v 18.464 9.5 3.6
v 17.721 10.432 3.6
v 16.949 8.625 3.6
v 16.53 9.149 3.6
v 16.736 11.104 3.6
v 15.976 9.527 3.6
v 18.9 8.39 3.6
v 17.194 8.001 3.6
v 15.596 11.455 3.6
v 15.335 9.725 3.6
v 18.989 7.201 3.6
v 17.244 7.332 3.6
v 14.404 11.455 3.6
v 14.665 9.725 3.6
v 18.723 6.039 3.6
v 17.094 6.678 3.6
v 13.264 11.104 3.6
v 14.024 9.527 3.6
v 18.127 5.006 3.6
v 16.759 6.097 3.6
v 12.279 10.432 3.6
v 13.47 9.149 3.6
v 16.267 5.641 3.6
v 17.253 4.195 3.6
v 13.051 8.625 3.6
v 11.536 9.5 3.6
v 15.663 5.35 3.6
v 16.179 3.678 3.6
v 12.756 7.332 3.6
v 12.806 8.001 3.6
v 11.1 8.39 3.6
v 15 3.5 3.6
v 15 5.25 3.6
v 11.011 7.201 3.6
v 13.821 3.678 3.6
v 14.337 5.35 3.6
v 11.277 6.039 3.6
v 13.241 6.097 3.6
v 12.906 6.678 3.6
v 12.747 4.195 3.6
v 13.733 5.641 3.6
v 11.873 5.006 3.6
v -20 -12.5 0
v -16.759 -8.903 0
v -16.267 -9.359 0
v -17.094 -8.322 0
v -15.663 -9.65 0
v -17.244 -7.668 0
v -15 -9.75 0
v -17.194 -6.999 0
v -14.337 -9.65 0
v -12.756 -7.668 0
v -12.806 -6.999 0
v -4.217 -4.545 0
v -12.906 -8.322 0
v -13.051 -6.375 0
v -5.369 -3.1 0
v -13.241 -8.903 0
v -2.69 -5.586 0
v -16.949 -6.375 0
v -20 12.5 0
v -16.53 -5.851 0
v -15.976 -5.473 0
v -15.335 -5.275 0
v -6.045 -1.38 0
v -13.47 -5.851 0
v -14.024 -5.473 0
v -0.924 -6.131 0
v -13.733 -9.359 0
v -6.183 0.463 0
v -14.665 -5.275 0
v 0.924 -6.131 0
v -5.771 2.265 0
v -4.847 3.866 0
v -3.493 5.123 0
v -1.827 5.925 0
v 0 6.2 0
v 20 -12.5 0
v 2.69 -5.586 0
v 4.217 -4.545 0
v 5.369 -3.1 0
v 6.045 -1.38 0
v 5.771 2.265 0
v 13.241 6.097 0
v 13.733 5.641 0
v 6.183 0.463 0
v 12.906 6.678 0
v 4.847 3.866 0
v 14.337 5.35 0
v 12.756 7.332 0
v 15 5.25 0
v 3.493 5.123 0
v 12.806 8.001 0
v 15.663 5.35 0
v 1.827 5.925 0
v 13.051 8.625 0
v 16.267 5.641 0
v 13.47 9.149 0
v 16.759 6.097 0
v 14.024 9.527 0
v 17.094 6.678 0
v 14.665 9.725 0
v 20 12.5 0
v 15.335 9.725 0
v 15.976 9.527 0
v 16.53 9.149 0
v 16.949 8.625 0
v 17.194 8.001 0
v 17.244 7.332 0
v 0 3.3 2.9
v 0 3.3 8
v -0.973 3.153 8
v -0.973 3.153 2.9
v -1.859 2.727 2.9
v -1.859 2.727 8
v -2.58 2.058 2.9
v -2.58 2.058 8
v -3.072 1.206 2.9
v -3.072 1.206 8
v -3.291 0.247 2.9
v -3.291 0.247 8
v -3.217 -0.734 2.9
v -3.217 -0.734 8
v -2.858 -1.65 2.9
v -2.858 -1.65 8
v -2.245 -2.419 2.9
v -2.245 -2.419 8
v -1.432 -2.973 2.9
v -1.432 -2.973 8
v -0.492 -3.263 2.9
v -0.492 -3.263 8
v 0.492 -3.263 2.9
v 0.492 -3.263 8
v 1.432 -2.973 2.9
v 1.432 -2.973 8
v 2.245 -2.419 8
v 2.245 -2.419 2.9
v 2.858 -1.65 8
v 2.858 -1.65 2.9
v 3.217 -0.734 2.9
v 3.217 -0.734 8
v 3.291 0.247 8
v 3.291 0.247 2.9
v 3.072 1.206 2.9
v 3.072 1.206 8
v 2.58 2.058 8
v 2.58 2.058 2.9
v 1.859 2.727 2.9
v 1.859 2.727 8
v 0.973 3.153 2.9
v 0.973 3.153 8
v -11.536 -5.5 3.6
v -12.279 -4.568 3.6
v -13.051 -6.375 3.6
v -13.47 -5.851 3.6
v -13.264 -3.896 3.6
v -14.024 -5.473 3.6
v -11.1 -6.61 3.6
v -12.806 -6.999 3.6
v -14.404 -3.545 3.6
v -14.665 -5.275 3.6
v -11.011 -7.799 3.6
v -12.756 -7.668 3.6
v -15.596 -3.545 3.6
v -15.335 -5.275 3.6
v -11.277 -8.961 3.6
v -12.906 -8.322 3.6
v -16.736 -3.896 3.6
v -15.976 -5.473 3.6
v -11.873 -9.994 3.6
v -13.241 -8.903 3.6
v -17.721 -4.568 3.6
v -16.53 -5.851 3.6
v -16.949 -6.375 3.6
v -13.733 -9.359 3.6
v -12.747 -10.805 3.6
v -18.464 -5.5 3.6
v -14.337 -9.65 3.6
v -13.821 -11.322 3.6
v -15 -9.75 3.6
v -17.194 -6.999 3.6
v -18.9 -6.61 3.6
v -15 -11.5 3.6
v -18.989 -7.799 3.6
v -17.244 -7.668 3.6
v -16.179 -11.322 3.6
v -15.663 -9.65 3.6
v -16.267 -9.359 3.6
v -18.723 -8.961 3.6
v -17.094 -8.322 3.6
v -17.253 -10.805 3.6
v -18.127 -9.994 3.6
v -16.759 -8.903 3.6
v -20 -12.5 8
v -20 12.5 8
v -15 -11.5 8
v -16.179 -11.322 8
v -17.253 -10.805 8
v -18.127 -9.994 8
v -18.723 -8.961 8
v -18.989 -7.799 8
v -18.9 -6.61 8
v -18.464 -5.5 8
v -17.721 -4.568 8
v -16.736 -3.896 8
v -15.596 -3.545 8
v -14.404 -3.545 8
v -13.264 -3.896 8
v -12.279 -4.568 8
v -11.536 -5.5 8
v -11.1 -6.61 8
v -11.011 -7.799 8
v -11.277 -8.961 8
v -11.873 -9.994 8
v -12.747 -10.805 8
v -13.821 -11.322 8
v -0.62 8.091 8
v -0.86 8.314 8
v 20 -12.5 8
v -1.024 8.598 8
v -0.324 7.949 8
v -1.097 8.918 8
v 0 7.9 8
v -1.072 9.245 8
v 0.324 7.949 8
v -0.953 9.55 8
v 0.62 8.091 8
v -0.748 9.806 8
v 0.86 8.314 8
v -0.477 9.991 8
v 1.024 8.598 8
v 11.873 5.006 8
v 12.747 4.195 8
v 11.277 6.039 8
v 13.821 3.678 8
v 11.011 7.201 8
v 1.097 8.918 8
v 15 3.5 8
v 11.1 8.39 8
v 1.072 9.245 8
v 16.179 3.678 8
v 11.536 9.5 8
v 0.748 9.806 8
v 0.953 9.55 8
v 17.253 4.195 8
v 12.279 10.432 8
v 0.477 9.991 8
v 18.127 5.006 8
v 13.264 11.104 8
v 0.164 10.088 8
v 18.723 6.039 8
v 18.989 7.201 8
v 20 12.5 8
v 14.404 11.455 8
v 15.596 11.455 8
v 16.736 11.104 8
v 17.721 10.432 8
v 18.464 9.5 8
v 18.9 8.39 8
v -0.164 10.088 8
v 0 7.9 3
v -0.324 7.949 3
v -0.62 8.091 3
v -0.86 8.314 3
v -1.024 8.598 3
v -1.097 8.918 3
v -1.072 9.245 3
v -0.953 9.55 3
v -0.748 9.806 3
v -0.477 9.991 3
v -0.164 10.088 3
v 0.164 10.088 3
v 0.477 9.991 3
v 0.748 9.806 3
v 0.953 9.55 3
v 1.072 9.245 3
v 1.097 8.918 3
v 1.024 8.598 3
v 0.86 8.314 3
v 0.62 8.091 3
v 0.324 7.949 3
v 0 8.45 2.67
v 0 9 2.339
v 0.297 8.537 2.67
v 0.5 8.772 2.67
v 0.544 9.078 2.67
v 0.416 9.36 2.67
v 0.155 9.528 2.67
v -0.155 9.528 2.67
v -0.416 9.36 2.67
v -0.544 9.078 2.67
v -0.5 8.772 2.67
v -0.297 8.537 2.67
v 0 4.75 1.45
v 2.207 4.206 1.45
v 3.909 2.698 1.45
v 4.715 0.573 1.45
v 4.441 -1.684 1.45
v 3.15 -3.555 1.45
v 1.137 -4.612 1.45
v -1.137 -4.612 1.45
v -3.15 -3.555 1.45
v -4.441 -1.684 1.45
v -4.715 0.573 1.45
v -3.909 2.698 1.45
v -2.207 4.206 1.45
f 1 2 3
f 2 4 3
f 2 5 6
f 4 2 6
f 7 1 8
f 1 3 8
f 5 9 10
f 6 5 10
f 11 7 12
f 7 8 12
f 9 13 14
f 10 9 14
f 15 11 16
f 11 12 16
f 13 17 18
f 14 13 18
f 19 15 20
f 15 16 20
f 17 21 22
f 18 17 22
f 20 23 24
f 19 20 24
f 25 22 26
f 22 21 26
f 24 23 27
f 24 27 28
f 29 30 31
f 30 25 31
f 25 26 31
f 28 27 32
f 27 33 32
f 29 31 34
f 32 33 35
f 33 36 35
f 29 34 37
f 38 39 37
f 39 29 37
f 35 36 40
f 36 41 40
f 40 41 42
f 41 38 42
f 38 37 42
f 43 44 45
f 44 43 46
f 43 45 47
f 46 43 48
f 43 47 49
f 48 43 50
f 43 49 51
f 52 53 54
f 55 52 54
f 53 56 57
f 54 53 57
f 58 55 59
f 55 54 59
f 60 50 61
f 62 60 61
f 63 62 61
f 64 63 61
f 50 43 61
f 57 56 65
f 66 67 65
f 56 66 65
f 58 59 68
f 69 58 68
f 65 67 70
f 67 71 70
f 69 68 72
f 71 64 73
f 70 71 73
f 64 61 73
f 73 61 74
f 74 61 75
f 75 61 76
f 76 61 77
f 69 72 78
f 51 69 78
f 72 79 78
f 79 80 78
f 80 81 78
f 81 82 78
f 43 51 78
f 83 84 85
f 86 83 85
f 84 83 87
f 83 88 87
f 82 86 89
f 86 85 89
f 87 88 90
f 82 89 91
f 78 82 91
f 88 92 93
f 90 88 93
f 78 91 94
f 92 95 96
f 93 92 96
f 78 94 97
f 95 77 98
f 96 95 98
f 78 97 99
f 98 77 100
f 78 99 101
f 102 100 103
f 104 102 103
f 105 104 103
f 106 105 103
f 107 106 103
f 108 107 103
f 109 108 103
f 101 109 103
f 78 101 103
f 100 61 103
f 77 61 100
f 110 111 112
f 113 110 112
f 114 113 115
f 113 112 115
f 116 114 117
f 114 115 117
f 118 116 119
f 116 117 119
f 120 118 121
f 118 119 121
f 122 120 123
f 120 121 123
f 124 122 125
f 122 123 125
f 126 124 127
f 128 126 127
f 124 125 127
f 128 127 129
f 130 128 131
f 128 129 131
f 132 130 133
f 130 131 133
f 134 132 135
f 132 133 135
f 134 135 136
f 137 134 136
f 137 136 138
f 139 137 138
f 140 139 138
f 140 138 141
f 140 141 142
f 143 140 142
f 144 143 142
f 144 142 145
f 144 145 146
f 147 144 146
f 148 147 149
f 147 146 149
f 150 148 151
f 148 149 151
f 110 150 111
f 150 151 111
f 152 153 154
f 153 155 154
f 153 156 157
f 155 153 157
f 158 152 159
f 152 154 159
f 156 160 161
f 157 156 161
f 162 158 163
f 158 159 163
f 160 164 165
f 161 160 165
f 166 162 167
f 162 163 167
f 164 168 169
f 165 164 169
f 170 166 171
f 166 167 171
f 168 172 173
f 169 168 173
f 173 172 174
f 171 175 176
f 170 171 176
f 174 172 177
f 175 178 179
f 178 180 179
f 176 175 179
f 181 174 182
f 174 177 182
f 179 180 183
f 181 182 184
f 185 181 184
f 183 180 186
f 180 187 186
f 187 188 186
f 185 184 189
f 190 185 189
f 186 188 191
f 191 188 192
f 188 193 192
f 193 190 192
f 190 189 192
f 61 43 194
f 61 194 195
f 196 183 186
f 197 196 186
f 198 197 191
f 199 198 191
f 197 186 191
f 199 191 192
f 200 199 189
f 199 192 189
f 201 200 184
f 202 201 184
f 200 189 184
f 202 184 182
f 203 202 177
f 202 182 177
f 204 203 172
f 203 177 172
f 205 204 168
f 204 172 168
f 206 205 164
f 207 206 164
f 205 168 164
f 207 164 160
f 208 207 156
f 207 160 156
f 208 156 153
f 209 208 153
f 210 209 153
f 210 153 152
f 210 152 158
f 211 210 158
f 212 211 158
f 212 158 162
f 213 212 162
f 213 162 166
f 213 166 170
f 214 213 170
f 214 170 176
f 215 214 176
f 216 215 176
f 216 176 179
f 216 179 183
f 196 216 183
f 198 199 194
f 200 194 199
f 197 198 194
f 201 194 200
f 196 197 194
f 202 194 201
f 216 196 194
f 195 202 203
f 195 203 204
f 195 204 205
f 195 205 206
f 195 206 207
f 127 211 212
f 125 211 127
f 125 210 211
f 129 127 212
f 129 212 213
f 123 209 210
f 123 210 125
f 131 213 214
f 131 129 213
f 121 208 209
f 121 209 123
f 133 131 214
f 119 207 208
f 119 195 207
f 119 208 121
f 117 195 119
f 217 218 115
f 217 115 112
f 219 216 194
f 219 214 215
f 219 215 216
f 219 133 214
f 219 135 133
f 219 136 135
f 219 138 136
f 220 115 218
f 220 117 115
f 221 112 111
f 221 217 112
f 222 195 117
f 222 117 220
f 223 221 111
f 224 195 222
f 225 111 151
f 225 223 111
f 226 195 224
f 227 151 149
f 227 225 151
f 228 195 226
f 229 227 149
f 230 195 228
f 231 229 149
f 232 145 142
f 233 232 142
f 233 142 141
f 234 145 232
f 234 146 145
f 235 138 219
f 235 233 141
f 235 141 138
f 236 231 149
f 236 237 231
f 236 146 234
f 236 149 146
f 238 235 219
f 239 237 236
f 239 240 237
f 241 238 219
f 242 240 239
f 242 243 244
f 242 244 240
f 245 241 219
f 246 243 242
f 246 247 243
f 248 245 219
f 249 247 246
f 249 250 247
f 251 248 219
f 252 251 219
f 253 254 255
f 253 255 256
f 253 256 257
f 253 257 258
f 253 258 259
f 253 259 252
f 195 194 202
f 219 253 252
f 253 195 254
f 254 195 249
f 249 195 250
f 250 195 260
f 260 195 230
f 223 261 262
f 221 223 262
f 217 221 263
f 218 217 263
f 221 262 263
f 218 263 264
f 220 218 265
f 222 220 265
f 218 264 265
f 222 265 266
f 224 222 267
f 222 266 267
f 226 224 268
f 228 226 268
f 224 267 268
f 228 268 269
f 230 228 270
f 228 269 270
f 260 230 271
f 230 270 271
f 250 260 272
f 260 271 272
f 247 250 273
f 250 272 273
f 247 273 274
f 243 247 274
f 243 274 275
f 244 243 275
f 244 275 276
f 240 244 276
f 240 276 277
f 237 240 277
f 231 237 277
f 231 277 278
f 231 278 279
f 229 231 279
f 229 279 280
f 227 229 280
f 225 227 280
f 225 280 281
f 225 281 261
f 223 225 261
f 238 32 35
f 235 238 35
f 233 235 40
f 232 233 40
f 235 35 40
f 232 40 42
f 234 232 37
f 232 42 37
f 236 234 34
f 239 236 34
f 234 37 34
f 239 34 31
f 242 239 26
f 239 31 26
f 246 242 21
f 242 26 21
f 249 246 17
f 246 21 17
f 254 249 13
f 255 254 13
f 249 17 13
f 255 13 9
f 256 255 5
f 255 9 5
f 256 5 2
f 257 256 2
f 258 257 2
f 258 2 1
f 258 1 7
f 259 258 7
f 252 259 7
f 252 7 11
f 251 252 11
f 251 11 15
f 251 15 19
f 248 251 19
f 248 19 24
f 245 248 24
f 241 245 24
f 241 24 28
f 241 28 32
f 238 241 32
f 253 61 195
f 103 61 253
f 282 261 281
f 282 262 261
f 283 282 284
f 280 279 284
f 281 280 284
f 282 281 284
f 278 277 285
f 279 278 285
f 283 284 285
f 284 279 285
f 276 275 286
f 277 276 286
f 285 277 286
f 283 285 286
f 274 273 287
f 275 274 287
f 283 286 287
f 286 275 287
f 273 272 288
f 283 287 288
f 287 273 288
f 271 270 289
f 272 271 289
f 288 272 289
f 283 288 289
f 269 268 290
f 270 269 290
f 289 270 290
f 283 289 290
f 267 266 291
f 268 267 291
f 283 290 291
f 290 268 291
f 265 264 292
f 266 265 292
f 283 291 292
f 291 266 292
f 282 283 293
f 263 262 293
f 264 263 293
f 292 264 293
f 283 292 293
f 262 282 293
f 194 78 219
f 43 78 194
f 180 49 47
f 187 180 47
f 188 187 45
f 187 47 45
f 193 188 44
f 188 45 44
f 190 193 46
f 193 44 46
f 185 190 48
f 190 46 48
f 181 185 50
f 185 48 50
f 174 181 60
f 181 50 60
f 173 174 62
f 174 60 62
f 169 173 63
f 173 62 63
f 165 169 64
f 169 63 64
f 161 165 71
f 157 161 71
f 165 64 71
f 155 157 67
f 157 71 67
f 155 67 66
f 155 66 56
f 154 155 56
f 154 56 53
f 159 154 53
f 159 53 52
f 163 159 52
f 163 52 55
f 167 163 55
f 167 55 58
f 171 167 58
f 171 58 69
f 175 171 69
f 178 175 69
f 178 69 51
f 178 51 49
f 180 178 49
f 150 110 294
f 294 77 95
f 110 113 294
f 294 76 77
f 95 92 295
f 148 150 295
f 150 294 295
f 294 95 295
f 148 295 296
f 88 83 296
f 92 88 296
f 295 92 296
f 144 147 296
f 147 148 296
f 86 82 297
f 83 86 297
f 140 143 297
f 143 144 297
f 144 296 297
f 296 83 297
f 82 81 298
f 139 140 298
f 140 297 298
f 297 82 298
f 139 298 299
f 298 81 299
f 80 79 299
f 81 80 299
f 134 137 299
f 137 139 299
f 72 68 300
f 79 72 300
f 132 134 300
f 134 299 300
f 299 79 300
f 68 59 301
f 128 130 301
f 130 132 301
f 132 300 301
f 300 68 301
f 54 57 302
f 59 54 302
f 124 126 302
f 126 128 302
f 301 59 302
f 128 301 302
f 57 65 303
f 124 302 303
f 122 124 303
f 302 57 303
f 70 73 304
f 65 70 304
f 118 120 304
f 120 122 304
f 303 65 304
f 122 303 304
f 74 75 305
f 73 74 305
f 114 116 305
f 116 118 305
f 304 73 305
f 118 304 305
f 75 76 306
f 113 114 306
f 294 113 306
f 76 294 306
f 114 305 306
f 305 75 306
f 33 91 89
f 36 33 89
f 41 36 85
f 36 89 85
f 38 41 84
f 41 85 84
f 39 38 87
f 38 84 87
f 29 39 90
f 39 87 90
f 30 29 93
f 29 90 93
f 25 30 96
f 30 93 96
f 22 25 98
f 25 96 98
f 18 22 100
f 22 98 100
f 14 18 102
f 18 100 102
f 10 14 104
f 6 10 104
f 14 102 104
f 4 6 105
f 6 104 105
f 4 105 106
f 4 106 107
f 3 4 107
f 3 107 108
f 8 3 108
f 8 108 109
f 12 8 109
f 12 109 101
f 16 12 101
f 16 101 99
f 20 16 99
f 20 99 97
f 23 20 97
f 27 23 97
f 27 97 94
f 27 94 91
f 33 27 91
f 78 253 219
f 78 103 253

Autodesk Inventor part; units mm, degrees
ref_plane "YZ Plane" through (0, 0, 0) normal (1, 0, 0) x (0, 1, 0)
ref_plane "XZ Plane" through (0, 0, 0) normal (0, 1, 0) x (-1, 0, 0)
ref_plane "XY Plane" through (0, 0, 0) normal (0, 0, 1) x (1, 0, 0)
sketch "Skizze1" plane through (0, 0, 0) normal (0, 0, 1) x (1, 0, 0)
  line L0 (-20, 12.5) -> (20, 12.5)
  line L1 (20, 12.5) -> (20, -12.5)
  line L2 (20, -12.5) -> (-20, -12.5)
  line L3 (-20, -12.5) -> (-20, 12.5)
  line L4 (-28, 0) -> (28, 0) projected
  line L5 (0, -17.5) -> (0, 17.5) projected
  point P0 (0, 0)
  dimension "d0" = 40
  dimension "d1" = 25
extrude "Extrusion1" add sketch "Skizze1" along normal blind 8
sketch "Skizze2" plane through (0, 0, 8) normal (0, 0, 1) x (1, 0, 0)
  line L0 (-28, 0) -> (28, 0) projected
  line L1 (0, -17.5) -> (0, 17.5) projected
  line L2 (-15, 7.5) -> (15, 7.5)
  line L3 (15, 7.5) -> (15, -7.5)
  line L4 (15, -7.5) -> (-15, -7.5)
  line L5 (-15, -7.5) -> (-15, 7.5)
  point P0 (0, 0)
  dimension "d4" = 15
  dimension "d5" = 30
hole "Bohrung1" at (-15, -7.5, 8) at (15, 7.5, 8) direction (0, 0, -1) diameter 4.5 end through all counterbore diameter 8 counterbore depth 4.4
sketch "Skizze3" plane through (0, 0, 8) normal (0, 0, 1) x (1, 0, 0)
  point P0 (0, 0)
  point P1 (0, 0)
hole "Bohrung2" at (0, 0, 8) direction (0, 0, -1) diameter 3 end through all
hole "Bohrung3" at (0, 0, 0) direction (0, 0, 1) diameter 6.6 end through all countersink diameter 12.4 countersink angle 90
sketch "Skizze4" plane through (0, 0, 8) normal (0, 0, 1) x (1, 0, 0)
  line L0 (-28, 0) -> (28, 0) projected
  line L1 (0, -17.5) -> (0, 17.5) projected
  point P0 (0, 9)
  dimension "d29" = 9
hole "Bohrung4" at (0, 9, 8) direction (0, 0, -1) diameter 2.2 depth 5 tip angle 118
properties part number "13_0204_074"
